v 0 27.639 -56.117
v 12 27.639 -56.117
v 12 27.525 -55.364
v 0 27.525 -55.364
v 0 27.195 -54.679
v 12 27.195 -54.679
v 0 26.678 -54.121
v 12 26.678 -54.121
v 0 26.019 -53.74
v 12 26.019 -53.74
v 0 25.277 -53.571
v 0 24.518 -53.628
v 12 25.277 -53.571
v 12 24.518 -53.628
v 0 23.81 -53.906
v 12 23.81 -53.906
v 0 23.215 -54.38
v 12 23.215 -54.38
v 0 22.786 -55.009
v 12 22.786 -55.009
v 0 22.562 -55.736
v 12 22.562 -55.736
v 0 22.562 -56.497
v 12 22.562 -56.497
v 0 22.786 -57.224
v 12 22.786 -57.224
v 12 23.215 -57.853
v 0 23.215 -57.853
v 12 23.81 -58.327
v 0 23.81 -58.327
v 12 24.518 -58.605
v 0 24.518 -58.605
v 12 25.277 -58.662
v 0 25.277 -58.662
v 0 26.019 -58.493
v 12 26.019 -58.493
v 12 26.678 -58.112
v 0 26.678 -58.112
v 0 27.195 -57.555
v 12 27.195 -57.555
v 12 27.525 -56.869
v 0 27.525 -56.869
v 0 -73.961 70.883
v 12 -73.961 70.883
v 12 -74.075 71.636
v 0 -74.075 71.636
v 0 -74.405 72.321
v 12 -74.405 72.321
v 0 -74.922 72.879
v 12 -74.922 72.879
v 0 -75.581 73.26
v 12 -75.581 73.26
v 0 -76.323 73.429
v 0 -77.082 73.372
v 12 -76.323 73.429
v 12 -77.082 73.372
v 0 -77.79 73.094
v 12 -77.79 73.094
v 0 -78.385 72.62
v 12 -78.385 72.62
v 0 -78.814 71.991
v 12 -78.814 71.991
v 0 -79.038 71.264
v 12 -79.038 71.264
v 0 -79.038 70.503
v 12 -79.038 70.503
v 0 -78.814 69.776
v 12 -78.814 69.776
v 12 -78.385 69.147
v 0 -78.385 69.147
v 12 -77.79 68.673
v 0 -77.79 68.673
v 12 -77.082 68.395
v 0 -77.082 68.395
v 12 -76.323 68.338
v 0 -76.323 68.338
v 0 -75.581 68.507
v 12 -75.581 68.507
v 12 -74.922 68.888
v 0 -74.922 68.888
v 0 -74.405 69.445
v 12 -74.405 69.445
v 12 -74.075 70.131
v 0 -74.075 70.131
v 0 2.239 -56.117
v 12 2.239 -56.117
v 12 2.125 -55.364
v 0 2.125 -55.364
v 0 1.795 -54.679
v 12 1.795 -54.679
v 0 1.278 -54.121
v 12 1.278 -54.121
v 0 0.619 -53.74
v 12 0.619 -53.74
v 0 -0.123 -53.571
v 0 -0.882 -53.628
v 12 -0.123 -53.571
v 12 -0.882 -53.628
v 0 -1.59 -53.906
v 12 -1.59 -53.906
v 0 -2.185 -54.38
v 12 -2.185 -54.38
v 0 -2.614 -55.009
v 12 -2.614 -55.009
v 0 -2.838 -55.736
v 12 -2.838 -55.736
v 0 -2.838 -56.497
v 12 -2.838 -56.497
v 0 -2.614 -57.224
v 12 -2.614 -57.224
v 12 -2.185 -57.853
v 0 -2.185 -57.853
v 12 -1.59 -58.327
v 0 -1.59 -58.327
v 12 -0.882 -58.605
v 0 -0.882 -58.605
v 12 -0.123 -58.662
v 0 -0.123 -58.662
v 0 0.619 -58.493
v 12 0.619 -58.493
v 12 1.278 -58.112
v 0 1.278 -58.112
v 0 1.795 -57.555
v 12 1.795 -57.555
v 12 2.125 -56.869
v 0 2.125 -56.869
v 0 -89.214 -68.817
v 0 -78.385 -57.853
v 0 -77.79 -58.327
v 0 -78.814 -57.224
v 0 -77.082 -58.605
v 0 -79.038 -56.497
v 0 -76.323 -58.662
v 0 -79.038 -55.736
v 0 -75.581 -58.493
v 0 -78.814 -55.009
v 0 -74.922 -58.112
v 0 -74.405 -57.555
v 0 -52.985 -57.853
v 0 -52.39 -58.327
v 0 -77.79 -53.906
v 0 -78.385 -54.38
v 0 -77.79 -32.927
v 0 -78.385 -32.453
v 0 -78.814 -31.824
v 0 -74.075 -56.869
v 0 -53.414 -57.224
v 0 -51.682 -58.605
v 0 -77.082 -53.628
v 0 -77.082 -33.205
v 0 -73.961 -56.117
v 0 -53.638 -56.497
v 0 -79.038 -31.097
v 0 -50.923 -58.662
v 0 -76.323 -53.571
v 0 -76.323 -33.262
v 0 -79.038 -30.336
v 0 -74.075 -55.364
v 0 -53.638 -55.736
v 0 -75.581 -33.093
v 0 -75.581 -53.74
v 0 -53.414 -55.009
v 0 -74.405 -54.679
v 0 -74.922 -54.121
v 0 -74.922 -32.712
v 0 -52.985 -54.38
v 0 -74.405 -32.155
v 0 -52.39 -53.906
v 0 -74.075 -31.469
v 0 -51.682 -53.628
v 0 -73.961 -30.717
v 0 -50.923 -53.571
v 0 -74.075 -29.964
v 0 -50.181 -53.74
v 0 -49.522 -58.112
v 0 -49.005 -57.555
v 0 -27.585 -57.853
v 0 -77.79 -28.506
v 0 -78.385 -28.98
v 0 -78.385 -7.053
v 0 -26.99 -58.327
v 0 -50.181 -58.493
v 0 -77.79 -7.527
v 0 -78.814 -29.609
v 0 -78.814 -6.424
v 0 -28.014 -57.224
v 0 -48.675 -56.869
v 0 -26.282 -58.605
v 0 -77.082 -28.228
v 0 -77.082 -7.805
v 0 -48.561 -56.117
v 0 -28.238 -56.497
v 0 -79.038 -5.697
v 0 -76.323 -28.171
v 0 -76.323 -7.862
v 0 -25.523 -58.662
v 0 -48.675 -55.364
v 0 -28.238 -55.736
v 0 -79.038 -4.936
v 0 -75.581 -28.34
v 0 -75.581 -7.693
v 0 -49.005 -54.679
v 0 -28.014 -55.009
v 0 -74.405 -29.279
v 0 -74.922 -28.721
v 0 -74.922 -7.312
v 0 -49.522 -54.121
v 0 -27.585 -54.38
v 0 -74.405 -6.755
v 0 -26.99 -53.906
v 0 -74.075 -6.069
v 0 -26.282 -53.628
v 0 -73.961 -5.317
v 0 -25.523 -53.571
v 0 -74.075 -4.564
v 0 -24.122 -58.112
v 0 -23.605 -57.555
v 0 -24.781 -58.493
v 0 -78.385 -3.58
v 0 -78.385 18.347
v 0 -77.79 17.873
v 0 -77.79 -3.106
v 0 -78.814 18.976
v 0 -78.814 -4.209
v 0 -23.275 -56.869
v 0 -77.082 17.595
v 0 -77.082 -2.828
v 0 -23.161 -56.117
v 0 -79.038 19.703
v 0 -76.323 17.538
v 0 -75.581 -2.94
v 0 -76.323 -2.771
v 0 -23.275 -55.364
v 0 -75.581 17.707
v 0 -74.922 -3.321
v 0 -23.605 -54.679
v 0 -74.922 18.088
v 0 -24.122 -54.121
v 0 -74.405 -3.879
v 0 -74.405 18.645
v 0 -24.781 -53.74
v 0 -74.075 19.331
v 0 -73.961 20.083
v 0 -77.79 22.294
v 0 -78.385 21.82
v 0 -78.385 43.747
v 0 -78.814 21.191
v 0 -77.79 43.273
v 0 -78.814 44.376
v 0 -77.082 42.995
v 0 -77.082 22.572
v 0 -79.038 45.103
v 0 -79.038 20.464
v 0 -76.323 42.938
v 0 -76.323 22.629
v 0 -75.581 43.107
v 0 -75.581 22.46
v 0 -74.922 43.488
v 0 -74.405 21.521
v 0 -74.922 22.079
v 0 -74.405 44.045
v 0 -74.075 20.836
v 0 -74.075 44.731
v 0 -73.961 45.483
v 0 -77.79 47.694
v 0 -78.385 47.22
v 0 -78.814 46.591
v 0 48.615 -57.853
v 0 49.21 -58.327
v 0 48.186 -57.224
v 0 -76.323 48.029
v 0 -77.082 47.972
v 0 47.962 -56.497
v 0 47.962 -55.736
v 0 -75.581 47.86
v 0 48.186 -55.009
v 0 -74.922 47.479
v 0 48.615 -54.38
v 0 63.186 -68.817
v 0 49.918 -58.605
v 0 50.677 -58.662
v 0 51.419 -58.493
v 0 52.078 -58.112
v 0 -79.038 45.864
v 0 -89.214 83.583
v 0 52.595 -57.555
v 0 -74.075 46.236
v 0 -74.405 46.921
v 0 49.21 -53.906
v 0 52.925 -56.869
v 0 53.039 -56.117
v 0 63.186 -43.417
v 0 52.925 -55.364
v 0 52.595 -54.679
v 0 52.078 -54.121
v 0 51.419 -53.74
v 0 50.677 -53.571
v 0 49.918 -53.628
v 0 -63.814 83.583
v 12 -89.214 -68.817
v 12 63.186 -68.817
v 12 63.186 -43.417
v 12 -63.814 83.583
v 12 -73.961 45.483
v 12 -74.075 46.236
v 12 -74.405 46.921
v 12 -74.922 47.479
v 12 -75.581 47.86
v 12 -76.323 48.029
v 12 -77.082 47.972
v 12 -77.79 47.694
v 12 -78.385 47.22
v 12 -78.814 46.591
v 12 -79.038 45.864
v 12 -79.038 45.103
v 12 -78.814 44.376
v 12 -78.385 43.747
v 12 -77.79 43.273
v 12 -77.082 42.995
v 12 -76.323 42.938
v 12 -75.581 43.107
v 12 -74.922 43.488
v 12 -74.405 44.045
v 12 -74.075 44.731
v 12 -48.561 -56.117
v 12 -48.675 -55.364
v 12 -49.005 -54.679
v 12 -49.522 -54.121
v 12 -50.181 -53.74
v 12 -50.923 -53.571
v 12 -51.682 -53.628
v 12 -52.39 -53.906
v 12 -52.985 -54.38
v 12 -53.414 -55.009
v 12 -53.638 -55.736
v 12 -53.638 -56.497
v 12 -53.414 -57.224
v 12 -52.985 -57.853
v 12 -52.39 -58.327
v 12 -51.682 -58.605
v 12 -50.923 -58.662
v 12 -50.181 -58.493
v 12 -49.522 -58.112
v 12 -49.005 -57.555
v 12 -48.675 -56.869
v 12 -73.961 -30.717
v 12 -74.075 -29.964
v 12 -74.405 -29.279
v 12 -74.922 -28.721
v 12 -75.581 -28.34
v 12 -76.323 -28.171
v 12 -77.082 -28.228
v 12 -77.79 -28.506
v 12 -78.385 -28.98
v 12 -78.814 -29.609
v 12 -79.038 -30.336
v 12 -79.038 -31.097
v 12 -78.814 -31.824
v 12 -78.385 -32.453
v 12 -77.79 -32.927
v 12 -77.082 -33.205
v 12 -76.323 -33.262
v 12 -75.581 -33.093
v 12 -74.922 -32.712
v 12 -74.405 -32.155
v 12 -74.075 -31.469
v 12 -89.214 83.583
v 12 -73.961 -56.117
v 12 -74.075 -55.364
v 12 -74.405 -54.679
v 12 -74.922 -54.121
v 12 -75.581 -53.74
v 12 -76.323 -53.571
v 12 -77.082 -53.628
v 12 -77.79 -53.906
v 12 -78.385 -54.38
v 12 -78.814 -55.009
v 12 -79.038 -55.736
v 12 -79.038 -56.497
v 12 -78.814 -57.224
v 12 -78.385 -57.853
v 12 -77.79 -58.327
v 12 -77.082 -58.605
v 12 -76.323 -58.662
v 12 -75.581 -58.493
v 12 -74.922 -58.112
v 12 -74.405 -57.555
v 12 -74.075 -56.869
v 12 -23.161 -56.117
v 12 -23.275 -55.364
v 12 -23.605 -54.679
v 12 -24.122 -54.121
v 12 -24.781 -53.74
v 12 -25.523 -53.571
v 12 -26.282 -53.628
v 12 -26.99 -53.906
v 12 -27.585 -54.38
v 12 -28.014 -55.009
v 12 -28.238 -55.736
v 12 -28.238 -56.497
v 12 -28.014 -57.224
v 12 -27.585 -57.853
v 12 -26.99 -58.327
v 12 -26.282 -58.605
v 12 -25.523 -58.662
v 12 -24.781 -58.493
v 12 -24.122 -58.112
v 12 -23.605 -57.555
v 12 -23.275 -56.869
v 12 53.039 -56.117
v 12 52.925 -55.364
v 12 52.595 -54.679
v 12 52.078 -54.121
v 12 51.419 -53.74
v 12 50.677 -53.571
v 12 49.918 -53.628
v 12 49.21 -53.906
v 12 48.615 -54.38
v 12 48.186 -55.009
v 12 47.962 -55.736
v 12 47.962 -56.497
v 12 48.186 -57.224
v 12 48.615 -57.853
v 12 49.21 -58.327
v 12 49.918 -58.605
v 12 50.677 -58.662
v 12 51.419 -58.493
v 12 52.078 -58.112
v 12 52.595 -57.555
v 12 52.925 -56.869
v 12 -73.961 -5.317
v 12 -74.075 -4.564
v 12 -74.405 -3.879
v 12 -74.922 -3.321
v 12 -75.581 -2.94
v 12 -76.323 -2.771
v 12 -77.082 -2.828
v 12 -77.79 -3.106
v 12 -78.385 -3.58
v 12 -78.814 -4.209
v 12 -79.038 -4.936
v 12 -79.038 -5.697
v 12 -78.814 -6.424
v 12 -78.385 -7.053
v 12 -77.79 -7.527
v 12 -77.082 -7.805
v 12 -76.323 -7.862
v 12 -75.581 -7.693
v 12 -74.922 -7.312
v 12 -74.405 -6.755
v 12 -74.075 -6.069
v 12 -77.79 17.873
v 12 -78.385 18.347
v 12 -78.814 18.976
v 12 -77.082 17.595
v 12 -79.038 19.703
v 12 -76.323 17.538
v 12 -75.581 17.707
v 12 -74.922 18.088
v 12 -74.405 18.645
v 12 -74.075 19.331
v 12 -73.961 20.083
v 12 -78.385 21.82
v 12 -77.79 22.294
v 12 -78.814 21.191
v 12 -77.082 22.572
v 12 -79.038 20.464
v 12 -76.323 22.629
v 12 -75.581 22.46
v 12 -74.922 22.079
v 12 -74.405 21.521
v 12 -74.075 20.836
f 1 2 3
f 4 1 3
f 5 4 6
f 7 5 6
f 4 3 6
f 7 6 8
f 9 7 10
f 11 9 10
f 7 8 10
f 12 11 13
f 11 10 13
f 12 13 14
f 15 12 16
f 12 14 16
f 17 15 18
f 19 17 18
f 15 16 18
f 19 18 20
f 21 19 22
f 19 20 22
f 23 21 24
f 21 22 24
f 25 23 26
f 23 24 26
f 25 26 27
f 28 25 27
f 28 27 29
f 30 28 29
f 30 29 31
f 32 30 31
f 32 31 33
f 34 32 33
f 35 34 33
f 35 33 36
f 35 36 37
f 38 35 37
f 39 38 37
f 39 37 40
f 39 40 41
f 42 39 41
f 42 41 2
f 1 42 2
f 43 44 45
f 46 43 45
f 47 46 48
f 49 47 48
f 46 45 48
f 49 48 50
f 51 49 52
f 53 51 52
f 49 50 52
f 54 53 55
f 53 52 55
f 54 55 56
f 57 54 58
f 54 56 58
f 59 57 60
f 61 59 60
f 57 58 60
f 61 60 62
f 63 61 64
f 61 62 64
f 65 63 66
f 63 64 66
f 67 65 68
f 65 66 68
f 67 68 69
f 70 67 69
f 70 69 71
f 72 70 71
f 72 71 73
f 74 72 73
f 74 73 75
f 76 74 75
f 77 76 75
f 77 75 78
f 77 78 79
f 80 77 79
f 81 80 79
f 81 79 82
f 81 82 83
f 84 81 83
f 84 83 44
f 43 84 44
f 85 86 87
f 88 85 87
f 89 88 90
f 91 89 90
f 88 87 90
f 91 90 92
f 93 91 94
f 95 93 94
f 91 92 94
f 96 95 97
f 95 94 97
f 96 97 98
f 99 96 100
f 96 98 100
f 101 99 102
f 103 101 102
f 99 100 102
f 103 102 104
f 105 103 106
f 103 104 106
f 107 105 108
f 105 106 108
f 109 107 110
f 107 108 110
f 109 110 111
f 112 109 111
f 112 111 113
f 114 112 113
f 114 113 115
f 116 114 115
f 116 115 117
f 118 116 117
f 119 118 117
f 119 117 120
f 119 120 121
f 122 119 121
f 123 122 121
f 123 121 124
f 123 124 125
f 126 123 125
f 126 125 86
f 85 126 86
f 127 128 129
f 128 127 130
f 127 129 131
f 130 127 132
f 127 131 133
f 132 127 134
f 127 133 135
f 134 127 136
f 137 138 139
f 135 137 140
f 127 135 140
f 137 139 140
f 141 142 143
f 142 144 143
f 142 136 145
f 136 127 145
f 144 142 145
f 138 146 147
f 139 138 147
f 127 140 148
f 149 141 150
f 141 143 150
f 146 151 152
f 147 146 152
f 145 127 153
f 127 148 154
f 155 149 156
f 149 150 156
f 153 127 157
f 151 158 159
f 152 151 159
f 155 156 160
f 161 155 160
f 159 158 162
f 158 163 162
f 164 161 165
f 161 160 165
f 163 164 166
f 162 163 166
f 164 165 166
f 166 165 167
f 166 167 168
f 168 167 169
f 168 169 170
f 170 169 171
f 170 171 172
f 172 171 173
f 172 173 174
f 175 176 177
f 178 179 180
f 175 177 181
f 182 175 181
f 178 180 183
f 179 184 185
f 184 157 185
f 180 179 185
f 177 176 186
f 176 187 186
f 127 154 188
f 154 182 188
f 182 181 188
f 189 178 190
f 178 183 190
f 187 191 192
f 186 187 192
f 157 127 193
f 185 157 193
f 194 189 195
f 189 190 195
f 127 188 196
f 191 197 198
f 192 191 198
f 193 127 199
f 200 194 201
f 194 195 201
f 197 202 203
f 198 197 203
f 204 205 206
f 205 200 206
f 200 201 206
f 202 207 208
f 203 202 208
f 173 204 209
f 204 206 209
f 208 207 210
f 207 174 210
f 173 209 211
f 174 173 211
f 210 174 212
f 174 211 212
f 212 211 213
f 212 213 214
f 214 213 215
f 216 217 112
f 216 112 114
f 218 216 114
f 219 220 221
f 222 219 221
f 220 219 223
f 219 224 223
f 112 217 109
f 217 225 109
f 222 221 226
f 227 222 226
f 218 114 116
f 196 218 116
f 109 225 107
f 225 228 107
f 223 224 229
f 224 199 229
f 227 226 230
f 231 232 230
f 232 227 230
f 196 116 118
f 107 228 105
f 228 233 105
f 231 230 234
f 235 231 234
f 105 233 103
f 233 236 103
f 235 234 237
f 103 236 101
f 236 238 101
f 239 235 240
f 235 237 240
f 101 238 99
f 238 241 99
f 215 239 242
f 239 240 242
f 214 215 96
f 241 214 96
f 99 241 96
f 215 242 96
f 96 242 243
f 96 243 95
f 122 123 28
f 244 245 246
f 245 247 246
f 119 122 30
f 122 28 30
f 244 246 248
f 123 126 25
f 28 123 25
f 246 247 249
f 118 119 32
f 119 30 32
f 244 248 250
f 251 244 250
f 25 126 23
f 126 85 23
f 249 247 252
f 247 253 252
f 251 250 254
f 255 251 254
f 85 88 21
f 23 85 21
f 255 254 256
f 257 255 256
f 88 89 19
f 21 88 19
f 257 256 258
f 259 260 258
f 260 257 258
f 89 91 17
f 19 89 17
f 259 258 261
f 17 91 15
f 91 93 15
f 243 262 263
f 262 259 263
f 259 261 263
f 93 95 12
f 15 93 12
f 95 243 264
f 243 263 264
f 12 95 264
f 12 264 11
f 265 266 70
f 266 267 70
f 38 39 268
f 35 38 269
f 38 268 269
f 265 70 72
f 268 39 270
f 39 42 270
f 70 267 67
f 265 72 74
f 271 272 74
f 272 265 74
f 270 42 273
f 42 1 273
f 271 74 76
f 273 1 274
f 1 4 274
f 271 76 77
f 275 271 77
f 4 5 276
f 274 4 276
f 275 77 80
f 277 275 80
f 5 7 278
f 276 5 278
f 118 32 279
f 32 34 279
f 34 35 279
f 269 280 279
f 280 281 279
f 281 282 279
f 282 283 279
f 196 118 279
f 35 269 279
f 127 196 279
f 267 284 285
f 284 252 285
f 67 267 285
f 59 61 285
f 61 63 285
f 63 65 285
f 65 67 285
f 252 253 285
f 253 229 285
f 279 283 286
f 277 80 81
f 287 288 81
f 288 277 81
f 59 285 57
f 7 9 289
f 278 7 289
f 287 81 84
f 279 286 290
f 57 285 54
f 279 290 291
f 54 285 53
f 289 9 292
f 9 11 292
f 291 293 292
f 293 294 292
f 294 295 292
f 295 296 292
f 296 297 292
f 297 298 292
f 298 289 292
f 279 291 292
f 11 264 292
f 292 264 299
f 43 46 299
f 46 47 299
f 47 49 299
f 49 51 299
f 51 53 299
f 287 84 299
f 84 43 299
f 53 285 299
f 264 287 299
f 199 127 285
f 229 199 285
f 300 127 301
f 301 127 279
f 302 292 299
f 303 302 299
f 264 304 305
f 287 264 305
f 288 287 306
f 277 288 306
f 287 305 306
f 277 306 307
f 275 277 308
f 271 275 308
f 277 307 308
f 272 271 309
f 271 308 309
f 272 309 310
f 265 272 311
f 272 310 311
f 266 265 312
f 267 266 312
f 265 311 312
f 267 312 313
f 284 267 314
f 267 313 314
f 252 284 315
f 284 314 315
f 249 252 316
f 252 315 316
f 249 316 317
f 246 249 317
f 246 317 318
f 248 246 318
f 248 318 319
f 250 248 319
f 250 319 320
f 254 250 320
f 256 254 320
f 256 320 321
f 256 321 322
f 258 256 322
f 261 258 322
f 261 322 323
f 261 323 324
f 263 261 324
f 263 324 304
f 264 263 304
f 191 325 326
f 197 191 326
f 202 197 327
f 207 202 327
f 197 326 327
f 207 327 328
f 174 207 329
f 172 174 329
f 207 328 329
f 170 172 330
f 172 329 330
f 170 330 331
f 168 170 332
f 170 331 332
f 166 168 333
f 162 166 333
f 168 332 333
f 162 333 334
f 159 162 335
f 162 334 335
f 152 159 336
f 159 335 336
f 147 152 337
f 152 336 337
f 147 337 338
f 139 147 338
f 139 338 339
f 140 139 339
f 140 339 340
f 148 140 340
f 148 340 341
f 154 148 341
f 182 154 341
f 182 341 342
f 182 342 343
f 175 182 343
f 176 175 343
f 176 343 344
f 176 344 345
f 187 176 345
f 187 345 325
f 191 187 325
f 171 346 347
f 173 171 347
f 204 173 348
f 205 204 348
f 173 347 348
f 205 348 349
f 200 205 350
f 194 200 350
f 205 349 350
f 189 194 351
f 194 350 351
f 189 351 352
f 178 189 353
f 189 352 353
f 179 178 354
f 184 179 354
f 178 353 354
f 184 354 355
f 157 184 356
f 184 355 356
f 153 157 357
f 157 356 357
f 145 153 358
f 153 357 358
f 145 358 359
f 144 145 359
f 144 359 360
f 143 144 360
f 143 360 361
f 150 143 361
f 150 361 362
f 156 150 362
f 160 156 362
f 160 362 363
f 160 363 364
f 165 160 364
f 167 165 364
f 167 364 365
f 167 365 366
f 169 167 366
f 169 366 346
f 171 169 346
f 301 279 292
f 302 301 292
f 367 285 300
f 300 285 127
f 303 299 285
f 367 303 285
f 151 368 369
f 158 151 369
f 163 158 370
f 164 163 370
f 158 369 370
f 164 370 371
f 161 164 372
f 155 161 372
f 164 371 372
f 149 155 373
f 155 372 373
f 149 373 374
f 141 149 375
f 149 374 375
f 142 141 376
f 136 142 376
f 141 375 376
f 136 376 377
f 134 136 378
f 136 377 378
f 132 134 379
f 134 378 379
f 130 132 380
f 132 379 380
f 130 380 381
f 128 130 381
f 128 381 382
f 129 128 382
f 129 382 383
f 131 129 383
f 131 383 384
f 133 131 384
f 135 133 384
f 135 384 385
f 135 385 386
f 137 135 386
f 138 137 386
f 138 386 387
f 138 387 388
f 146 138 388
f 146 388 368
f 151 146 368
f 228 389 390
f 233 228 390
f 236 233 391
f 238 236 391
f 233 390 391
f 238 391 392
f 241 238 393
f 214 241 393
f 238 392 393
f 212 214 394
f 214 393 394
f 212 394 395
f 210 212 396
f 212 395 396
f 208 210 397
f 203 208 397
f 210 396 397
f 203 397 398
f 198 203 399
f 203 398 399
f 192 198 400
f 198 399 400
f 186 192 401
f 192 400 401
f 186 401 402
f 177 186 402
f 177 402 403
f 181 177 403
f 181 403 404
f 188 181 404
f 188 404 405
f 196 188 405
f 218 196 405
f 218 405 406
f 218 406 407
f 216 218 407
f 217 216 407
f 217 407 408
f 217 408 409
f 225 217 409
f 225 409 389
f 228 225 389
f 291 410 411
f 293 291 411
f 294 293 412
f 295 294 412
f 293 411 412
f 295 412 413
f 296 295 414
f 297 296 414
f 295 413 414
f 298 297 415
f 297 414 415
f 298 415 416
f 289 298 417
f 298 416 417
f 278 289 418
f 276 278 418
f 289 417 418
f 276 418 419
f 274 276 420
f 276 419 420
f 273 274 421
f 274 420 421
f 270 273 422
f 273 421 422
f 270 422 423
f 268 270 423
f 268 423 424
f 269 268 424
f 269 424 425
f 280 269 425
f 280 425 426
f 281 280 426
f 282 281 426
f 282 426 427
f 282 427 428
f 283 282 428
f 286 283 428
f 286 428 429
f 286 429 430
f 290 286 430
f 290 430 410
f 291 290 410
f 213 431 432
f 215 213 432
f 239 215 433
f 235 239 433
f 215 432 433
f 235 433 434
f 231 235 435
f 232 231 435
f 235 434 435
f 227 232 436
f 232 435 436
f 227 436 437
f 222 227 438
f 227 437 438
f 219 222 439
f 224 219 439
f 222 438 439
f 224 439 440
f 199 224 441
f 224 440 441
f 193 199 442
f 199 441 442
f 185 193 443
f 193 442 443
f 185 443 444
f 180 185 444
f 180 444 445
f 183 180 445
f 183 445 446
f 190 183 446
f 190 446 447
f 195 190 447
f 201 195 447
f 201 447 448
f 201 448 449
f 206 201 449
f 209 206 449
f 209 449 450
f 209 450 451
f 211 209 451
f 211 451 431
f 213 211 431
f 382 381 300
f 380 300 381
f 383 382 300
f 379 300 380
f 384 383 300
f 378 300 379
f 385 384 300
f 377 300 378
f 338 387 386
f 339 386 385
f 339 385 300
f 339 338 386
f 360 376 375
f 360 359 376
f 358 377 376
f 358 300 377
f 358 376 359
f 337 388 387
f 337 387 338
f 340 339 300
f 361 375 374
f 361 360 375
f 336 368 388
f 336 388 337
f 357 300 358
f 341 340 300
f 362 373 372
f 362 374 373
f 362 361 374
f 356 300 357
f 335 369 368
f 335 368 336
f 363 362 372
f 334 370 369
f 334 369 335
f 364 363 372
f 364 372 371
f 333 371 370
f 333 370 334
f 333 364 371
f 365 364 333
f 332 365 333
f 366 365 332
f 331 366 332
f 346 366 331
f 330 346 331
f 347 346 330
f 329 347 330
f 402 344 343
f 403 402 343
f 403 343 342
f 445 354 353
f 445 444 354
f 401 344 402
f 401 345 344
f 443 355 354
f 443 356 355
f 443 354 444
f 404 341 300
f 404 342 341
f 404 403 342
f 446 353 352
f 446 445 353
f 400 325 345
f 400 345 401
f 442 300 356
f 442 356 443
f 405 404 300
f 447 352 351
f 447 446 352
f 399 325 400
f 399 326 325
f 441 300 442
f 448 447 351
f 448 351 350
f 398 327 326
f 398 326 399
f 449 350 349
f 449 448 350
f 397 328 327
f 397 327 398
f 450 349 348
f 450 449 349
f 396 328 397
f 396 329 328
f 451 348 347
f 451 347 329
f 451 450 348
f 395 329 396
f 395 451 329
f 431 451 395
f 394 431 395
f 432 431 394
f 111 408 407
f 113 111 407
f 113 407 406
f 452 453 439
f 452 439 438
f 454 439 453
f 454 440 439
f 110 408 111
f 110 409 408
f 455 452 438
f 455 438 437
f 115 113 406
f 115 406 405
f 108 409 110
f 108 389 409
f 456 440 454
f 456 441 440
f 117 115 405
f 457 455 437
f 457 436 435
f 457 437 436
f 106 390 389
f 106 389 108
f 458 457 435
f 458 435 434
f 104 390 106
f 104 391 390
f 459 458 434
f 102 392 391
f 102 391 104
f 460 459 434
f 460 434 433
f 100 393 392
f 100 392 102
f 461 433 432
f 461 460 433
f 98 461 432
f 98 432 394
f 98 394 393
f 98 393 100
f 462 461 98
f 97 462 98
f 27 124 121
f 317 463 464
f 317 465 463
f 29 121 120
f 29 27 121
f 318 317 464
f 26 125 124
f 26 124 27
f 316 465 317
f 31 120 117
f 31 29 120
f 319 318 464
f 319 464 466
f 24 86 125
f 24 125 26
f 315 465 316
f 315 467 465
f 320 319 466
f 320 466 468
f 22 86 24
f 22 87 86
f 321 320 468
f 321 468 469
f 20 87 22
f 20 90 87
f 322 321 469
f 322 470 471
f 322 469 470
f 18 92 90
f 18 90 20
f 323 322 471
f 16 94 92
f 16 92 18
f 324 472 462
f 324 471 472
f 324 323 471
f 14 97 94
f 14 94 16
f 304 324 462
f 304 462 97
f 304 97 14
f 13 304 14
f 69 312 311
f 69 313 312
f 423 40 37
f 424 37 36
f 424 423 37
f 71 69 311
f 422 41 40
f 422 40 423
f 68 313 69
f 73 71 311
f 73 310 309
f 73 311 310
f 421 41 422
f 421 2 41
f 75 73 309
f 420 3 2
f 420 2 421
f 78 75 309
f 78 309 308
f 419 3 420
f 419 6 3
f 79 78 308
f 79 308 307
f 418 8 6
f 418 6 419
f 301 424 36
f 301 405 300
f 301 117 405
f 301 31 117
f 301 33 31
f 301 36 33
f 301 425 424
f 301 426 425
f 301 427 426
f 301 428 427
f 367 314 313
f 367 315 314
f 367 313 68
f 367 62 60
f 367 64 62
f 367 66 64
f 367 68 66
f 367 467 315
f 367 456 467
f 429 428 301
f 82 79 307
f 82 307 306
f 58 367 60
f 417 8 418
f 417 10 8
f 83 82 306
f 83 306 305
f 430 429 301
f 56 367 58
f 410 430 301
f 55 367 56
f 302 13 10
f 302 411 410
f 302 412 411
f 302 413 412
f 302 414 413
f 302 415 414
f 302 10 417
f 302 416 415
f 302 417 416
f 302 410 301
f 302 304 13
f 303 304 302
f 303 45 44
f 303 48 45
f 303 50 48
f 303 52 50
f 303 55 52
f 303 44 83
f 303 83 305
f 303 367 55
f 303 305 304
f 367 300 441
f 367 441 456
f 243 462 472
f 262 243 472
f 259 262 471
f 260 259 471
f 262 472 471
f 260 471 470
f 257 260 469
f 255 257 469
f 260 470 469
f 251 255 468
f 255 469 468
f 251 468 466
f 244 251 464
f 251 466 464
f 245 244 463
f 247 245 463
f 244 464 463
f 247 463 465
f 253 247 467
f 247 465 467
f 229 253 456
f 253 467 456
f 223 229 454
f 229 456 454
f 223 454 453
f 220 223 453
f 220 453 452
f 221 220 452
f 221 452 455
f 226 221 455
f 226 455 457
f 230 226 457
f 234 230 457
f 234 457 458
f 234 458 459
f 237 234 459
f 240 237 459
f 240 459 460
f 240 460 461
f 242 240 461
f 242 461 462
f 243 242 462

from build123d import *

# Parameters (mm, degrees)
F1_DEPTH = 12
F2_R     = 2.5527
F3_DEPTH = 25.4


with BuildPart() as f1:
    # F0 (on Right) → F1 (new body)
    with BuildSketch(Plane.YZ):
        Polygon((-63.814045, 83.583468), (-89.214045, 83.583468), (-89.214045, -68.816532), (63.185955, -68.816532), (63.185955, -43.416532), align=None)
    extrude(amount=F1_DEPTH)

    # F2 (on face) → F3 (cut)
    with BuildSketch(Plane.YZ.offset(12)):
        with Locations((-76.514045, -56.116532)):
            Circle(F2_R)
        with Locations((-76.514045, -30.716532)):
            Circle(F2_R)
        with Locations((-76.514045, -5.316532)):
            Circle(F2_R)
        with Locations((-76.514045, 20.083468)):
            Circle(F2_R)
        with Locations((-76.514045, 45.483468)):
            Circle(F2_R)
        with Locations((-76.514045, 70.883468)):
            Circle(F2_R)
        with Locations((-51.114045, -56.116532)):
            Circle(F2_R)
        with Locations((-25.714045, -56.116532)):
            Circle(F2_R)
        with Locations((-0.314045, -56.116532)):
            Circle(F2_R)
        with Locations((25.085955, -56.116532)):
            Circle(F2_R)
        with Locations((50.485955, -56.116532)):
            Circle(F2_R)
    extrude(amount=-F3_DEPTH, mode=Mode.SUBTRACT)


solid = f1.part
